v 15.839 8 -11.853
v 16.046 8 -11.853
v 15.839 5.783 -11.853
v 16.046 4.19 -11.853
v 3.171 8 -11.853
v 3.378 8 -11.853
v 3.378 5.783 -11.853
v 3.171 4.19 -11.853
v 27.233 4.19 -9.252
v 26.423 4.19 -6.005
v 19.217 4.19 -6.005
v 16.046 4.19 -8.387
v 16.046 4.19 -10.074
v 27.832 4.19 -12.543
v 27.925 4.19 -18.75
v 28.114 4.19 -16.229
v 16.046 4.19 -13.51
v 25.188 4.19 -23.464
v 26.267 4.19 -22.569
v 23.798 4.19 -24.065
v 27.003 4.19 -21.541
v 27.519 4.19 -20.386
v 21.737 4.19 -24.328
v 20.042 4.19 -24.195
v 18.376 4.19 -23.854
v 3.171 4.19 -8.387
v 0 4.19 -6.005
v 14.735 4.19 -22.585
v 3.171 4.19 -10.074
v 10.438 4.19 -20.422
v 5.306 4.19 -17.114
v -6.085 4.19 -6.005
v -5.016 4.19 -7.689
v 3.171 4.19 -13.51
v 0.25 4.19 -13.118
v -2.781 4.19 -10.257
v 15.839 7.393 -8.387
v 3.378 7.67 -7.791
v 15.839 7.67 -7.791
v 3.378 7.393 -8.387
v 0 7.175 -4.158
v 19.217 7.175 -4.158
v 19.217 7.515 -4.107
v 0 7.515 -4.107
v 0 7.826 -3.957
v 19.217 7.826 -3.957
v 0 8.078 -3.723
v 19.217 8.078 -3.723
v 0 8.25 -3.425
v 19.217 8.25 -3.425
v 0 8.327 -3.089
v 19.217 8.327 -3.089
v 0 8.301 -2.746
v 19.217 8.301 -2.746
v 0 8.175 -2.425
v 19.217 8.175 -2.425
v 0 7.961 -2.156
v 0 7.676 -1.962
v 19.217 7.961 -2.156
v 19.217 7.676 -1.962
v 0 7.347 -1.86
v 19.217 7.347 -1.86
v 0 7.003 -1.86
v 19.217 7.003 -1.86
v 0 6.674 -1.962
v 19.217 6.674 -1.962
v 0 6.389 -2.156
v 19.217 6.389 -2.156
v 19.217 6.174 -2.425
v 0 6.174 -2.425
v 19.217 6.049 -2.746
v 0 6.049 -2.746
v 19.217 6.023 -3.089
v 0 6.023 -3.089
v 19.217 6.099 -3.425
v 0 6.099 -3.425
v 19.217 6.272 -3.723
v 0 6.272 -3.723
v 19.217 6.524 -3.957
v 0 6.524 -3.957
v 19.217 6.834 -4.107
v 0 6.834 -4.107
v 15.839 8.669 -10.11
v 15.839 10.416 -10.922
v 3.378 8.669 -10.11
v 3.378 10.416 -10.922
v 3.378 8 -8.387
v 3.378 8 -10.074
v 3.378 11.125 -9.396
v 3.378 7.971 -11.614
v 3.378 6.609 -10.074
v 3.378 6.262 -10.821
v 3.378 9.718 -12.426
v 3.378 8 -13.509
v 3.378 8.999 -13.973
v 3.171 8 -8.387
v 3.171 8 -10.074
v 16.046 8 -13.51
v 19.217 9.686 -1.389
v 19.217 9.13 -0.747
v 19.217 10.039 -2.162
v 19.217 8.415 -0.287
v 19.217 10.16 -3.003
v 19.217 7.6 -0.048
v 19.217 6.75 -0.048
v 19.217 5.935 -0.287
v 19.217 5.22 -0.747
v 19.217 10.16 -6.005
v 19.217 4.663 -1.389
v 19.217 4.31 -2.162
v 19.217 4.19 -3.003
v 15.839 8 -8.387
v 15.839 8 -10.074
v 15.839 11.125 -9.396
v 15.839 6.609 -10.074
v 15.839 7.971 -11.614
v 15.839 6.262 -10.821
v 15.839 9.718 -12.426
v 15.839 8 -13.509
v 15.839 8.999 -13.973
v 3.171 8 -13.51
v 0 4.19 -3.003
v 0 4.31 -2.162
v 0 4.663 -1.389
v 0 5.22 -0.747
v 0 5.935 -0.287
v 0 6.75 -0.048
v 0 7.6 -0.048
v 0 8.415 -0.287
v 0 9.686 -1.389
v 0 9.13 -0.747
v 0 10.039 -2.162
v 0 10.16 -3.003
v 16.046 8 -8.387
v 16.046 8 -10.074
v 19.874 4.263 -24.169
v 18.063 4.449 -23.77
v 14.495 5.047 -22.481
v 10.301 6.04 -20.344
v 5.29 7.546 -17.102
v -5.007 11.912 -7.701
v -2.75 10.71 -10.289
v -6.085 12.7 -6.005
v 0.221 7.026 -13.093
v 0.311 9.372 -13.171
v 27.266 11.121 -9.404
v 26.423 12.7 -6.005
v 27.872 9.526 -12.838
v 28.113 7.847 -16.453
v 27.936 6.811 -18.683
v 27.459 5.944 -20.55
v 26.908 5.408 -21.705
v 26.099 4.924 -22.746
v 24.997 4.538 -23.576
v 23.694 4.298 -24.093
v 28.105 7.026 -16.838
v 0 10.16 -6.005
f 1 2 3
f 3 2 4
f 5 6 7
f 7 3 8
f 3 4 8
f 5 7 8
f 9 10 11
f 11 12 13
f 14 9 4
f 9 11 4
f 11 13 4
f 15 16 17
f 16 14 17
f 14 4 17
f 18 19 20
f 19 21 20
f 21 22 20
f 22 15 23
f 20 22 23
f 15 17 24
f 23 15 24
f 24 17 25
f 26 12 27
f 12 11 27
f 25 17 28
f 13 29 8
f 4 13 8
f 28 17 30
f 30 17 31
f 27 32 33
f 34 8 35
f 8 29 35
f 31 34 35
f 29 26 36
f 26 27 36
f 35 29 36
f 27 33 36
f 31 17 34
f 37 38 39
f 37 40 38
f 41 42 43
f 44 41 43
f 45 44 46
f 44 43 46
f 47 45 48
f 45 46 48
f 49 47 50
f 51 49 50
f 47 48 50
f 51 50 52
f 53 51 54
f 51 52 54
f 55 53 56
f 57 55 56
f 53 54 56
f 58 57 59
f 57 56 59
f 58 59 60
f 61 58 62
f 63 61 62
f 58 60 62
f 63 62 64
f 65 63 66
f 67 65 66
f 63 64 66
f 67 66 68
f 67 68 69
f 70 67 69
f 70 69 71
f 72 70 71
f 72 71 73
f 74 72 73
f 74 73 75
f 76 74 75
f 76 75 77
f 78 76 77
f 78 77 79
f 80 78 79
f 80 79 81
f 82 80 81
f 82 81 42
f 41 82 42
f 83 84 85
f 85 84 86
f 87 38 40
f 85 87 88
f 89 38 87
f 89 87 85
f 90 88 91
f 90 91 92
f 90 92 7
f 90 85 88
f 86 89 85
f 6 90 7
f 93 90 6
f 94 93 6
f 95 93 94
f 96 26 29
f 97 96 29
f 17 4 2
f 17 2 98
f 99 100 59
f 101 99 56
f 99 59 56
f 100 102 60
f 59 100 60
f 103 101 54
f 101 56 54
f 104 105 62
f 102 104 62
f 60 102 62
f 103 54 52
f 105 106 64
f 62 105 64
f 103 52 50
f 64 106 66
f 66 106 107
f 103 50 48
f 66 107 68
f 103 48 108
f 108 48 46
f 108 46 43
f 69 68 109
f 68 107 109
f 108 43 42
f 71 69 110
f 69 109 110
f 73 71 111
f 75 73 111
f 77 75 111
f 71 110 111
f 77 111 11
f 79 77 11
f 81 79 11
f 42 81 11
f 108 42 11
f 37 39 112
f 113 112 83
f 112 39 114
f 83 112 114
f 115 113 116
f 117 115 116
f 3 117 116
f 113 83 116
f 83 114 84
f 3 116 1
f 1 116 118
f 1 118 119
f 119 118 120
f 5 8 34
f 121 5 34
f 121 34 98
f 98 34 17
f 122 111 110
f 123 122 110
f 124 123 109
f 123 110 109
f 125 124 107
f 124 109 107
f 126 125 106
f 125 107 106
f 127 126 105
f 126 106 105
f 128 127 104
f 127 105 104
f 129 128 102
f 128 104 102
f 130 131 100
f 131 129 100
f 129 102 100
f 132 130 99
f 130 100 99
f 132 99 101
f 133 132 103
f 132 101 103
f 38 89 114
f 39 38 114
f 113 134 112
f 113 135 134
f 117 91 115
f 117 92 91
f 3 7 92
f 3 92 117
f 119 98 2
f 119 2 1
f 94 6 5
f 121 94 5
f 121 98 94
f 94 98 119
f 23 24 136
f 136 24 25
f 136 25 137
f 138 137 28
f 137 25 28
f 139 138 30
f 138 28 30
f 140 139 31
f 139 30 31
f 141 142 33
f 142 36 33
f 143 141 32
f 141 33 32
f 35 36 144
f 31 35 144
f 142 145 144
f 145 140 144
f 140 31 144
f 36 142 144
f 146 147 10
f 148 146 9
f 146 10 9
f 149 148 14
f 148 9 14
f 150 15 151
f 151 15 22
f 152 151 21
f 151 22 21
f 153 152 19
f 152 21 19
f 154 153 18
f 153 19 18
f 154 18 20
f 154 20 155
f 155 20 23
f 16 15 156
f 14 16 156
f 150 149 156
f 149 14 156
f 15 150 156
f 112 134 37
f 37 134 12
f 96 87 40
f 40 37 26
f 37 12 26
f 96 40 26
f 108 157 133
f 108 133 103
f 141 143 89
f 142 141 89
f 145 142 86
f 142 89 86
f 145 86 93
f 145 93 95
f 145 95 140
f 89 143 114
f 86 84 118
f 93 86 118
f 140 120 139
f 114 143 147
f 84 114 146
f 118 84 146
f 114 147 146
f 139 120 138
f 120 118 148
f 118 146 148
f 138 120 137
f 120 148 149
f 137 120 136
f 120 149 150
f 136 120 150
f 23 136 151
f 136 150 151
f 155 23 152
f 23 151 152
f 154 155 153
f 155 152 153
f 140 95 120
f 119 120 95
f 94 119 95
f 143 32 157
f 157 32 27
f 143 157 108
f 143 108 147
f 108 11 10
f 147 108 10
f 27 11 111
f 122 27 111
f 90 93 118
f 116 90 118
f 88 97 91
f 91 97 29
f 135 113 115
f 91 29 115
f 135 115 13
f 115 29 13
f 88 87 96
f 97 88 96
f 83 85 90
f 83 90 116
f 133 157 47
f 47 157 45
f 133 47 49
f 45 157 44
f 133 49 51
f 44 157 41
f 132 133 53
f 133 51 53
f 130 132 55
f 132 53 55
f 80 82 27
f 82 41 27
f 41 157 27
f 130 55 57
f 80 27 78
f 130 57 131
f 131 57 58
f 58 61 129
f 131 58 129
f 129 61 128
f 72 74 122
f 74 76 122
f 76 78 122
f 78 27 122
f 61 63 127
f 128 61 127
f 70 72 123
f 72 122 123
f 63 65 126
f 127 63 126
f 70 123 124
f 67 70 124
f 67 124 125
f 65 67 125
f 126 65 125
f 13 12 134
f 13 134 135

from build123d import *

# Parameters (mm, degrees)
BOSS_EXTRUDE1_DEPTH     = 12.7
SKETCH2_W               = 19.216952518
SKETCH2_H               = 6.005297662
CUT_EXTRUDE1_DEPTH      = 2.54
SKETCH3_W               = 18.322345719
SKETCH3_H               = 4.189551825
SKETCH3_R               = 1.155216028
CUT_EXTRUDE2_DEPTH      = 11.684
CUT_EXTRUDE2_DEPTH_BACK = 26.924
SKETCH4_W               = 6.230536122
SKETCH4_H               = 1.706386664
SKETCH4_W_2             = 6.230536121
SKETCH4_H_2             = 1.682353049
CUT_EXTRUDE4_DEPTH      = 3.81
SKETCH5_W               = 12.461072243
SKETCH5_H               = 1.883415491
CUT_EXTRUDE5_DEPTH      = 2.54
SKETCH6_W               = 6.43751361
SKETCH6_H               = 1.686706137
SKETCH6_H_2             = 1.657293844
CUT_EXTRUDE6_DEPTH      = 1.0000001
CUT_EXTRUDE6_DEPTH_BACK = 3.81


with BuildPart() as part:
    # Sketch1 → Boss-Extrude1 (new body)
    with BuildSketch(Plane(origin=(0, 0, 0), x_dir=(1, 0, 0), z_dir=(0, 1, 0))):
        with BuildLine():
            Line((0, 0), (19.216952518, 0))
            Line((19.216952518, 0), (19.216952518, 6.005297662))
            Line((19.216952518, 6.005297662), (26.423309712, 6.005297662))
            add(Edge.make_bspline(
                [(26.423309712, 6.005297662), (36.55952446, 42.663140535), (-2.021004002, 14.397041287), (-6.085368297, 6.005297662)],
                knots=[0, 0, 0, 0, 1, 1, 1, 1], degree=3))
            Line((-6.085368297, 6.005297662), (0, 6.005297662))
            Line((0, 6.005297662), (0, 0))
        make_face()
    extrude(amount=BOSS_EXTRUDE1_DEPTH)

    # Sketch2 → Cut-Extrude1 (cut)
    with BuildSketch(Plane(origin=(0, 12.7, 0), x_dir=(1, 0, 0), z_dir=(0, 1, 0))):
        with Locations((9.608476259, 3.002648831)):
            Rectangle(SKETCH2_W, SKETCH2_H)
    extrude(amount=-CUT_EXTRUDE1_DEPTH, mode=Mode.SUBTRACT)

    # Sketch3 → Cut-Extrude2 (cut, two sides)
    with BuildSketch(Plane(origin=(19.216952518, 0, 0), x_dir=(0, 0, -1), z_dir=(1, 0, 0))) as cut_extrude2_sk:
        Polygon((24.327643381, 12.7), (6.005297662, 12.7), (24.327643381, 4.189551825), align=None)
        with Locations((15.166470522, 2.094775913)):
            Rectangle(SKETCH3_W, SKETCH3_H)
        Polygon((3.002648831, 4.189551825), (0, 4.189551825), (0, 0), (6.005297662, 0), (6.005297662, 4.189551825), align=None)
        with BuildLine():
            Line((3.002648831, 10.16), (0, 10.16))
            Line((0, 10.16), (0, 4.189551825))
            Line((0, 4.189551825), (3.002648831, 4.189551825))
            ThreePointArc((3.002648831, 4.189551825), (0.017424743, 7.174775912), (3.002648831, 10.16))
        make_face()
        with Locations((3.002648831, 7.174775912)):
            Circle(SKETCH3_R)
    extrude(amount=CUT_EXTRUDE2_DEPTH, mode=Mode.SUBTRACT)
    extrude(cut_extrude2_sk.sketch, amount=-CUT_EXTRUDE2_DEPTH_BACK, mode=Mode.SUBTRACT)

    # Sketch4 → Cut-Extrude4 (cut)
    with BuildSketch(Plane(origin=(0, 12.740629014, -5.917826495), x_dir=(1, 0, 0), z_dir=(0, 0.906940046, -0.421259722))):
        with Locations((6.493208198, 8.028748928)):
            Rectangle(SKETCH4_W, SKETCH4_H)
        with Locations((12.72374432, 8.028748928)):
            Rectangle(SKETCH4_W_2, SKETCH4_H)
        with Locations((12.72374432, 4.676059638)):
            Rectangle(SKETCH4_W_2, SKETCH4_H_2)
        with Locations((6.493208198, 4.676059638)):
            Rectangle(SKETCH4_W, SKETCH4_H_2)
    extrude(amount=-CUT_EXTRUDE4_DEPTH, mode=Mode.SUBTRACT)

    # Sketch5 → Cut-Extrude5 (cut)
    with BuildSketch(Plane(origin=(0, -2.32418937, -5.003802419), x_dir=(1, 0, 0), z_dir=(0, 0.421259722, 0.906940046))):
        with Locations((9.608476259, 11.179636351)):
            Rectangle(SKETCH5_W, SKETCH5_H)
    extrude(amount=-CUT_EXTRUDE5_DEPTH, mode=Mode.SUBTRACT)

    # Sketch6 → Cut-Extrude6 (cut, two sides)
    with BuildSketch(Plane(origin=(0, 4.189551825, 0), x_dir=(-1, 0, 0), z_dir=(0, -1, 0))) as cut_extrude6_sk:
        with Locations((-6.389719454, 9.230258043)):
            Rectangle(SKETCH6_W, SKETCH6_H)
        with Locations((-12.827233064, 9.230258043)):
            Rectangle(SKETCH6_W, SKETCH6_H)
        with Locations((-12.827233064, 12.681510307)):
            Rectangle(SKETCH6_W, SKETCH6_H_2)
        with Locations((-6.389719454, 12.681510307)):
            Rectangle(SKETCH6_W, SKETCH6_H_2)
    extrude(amount=CUT_EXTRUDE6_DEPTH, mode=Mode.SUBTRACT)
    extrude(cut_extrude6_sk.sketch, amount=-CUT_EXTRUDE6_DEPTH_BACK, mode=Mode.SUBTRACT)


solid = part.part
